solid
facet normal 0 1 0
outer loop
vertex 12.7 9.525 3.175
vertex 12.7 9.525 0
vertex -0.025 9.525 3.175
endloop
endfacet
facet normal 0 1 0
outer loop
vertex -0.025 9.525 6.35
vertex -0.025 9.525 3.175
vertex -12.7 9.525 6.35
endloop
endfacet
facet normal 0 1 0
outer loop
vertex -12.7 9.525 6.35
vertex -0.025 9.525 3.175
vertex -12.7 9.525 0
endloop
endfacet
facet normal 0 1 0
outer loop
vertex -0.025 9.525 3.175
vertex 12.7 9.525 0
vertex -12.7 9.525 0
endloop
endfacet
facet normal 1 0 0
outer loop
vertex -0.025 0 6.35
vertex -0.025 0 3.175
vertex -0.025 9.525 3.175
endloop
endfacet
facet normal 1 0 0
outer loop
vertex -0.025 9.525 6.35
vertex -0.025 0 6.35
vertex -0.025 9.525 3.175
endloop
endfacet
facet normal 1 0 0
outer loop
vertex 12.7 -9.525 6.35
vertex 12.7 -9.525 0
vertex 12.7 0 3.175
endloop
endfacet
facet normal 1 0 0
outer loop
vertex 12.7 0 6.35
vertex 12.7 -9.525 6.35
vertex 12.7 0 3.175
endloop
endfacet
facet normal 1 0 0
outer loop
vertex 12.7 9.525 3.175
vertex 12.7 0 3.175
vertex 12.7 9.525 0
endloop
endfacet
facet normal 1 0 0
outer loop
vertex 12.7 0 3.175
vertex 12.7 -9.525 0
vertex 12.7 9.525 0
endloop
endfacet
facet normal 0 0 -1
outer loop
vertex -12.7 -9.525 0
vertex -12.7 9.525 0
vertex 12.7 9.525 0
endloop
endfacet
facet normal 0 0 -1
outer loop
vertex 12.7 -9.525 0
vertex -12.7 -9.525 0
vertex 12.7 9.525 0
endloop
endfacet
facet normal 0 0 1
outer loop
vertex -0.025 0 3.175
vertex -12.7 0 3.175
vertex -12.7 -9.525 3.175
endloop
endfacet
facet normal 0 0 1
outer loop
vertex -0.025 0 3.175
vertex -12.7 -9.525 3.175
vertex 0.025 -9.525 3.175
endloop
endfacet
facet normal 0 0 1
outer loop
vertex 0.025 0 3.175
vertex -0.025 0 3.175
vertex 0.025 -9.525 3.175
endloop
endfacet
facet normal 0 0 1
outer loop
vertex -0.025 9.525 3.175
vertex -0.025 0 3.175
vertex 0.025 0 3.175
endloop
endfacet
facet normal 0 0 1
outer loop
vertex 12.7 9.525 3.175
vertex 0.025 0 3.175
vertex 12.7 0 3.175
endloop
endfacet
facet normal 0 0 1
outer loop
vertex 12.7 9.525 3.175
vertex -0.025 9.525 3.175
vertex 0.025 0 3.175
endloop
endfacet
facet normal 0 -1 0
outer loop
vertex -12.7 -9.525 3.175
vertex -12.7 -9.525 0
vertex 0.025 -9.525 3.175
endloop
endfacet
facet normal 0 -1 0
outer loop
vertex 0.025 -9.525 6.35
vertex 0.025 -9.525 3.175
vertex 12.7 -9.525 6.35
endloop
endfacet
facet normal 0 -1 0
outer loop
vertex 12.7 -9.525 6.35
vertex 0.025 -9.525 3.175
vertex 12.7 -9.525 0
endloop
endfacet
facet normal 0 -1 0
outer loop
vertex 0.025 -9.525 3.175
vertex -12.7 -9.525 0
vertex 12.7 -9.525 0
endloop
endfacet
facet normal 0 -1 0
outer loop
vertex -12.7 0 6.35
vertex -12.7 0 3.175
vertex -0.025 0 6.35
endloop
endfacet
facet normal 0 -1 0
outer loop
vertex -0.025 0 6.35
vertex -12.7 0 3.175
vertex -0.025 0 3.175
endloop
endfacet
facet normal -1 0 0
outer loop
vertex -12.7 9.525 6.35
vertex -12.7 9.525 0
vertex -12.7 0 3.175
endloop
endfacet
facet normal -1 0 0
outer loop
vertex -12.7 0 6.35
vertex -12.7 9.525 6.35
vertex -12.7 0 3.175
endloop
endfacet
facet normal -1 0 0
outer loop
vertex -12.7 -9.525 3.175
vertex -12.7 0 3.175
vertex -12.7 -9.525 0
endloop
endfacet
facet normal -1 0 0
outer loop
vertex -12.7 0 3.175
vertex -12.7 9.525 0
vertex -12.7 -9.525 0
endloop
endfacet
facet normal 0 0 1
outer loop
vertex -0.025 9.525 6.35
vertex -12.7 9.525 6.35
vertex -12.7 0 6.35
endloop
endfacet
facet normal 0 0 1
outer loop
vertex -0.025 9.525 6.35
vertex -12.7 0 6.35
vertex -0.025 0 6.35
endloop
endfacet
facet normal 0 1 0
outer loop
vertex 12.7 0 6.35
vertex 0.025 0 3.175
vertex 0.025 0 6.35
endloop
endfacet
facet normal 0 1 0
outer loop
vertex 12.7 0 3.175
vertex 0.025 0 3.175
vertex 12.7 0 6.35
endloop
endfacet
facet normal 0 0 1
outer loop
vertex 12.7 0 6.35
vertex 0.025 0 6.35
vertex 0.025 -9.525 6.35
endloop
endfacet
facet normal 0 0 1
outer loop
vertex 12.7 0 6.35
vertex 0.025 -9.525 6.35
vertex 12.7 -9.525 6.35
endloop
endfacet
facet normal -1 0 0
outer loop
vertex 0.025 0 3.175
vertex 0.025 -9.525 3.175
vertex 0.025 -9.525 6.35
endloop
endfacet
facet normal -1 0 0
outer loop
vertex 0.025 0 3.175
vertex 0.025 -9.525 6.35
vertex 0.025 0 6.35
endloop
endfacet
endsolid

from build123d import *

# Parameters (mm, degrees)
F0_W     = 12.6746
F0_H     = 9.525
F0_W_2   = 0.0508
F1_DEPTH = 3.175
F2_DEPTH = 6.35


with BuildPart() as f1:
    # F0 (on Top) → F1 (new body)
    with BuildSketch(Plane.XY):
        with Locations((-6.3627, 4.7625)):
            Rectangle(F0_W, F0_H)
        with Locations((6.3627, 4.7625)):
            Rectangle(F0_W, F0_H)
        with Locations((6.3627, -4.7625)):
            Rectangle(F0_W, F0_H)
        with Locations((-6.3627, -4.7625)):
            Rectangle(F0_W, F0_H)
        with Locations((0, 4.7625)):
            Rectangle(F0_W_2, F0_H)
        with Locations((0, -4.7625)):
            Rectangle(F0_W_2, F0_H)
    extrude(amount=F1_DEPTH)

    # F0 (on Top) → F2 (join)
    with BuildSketch(Plane.XY):
        with Locations((6.3627, -4.7625)):
            Rectangle(F0_W, F0_H)
        with Locations((-6.3627, 4.7625)):
            Rectangle(F0_W, F0_H)
    extrude(amount=F2_DEPTH)


solid = f1.part
